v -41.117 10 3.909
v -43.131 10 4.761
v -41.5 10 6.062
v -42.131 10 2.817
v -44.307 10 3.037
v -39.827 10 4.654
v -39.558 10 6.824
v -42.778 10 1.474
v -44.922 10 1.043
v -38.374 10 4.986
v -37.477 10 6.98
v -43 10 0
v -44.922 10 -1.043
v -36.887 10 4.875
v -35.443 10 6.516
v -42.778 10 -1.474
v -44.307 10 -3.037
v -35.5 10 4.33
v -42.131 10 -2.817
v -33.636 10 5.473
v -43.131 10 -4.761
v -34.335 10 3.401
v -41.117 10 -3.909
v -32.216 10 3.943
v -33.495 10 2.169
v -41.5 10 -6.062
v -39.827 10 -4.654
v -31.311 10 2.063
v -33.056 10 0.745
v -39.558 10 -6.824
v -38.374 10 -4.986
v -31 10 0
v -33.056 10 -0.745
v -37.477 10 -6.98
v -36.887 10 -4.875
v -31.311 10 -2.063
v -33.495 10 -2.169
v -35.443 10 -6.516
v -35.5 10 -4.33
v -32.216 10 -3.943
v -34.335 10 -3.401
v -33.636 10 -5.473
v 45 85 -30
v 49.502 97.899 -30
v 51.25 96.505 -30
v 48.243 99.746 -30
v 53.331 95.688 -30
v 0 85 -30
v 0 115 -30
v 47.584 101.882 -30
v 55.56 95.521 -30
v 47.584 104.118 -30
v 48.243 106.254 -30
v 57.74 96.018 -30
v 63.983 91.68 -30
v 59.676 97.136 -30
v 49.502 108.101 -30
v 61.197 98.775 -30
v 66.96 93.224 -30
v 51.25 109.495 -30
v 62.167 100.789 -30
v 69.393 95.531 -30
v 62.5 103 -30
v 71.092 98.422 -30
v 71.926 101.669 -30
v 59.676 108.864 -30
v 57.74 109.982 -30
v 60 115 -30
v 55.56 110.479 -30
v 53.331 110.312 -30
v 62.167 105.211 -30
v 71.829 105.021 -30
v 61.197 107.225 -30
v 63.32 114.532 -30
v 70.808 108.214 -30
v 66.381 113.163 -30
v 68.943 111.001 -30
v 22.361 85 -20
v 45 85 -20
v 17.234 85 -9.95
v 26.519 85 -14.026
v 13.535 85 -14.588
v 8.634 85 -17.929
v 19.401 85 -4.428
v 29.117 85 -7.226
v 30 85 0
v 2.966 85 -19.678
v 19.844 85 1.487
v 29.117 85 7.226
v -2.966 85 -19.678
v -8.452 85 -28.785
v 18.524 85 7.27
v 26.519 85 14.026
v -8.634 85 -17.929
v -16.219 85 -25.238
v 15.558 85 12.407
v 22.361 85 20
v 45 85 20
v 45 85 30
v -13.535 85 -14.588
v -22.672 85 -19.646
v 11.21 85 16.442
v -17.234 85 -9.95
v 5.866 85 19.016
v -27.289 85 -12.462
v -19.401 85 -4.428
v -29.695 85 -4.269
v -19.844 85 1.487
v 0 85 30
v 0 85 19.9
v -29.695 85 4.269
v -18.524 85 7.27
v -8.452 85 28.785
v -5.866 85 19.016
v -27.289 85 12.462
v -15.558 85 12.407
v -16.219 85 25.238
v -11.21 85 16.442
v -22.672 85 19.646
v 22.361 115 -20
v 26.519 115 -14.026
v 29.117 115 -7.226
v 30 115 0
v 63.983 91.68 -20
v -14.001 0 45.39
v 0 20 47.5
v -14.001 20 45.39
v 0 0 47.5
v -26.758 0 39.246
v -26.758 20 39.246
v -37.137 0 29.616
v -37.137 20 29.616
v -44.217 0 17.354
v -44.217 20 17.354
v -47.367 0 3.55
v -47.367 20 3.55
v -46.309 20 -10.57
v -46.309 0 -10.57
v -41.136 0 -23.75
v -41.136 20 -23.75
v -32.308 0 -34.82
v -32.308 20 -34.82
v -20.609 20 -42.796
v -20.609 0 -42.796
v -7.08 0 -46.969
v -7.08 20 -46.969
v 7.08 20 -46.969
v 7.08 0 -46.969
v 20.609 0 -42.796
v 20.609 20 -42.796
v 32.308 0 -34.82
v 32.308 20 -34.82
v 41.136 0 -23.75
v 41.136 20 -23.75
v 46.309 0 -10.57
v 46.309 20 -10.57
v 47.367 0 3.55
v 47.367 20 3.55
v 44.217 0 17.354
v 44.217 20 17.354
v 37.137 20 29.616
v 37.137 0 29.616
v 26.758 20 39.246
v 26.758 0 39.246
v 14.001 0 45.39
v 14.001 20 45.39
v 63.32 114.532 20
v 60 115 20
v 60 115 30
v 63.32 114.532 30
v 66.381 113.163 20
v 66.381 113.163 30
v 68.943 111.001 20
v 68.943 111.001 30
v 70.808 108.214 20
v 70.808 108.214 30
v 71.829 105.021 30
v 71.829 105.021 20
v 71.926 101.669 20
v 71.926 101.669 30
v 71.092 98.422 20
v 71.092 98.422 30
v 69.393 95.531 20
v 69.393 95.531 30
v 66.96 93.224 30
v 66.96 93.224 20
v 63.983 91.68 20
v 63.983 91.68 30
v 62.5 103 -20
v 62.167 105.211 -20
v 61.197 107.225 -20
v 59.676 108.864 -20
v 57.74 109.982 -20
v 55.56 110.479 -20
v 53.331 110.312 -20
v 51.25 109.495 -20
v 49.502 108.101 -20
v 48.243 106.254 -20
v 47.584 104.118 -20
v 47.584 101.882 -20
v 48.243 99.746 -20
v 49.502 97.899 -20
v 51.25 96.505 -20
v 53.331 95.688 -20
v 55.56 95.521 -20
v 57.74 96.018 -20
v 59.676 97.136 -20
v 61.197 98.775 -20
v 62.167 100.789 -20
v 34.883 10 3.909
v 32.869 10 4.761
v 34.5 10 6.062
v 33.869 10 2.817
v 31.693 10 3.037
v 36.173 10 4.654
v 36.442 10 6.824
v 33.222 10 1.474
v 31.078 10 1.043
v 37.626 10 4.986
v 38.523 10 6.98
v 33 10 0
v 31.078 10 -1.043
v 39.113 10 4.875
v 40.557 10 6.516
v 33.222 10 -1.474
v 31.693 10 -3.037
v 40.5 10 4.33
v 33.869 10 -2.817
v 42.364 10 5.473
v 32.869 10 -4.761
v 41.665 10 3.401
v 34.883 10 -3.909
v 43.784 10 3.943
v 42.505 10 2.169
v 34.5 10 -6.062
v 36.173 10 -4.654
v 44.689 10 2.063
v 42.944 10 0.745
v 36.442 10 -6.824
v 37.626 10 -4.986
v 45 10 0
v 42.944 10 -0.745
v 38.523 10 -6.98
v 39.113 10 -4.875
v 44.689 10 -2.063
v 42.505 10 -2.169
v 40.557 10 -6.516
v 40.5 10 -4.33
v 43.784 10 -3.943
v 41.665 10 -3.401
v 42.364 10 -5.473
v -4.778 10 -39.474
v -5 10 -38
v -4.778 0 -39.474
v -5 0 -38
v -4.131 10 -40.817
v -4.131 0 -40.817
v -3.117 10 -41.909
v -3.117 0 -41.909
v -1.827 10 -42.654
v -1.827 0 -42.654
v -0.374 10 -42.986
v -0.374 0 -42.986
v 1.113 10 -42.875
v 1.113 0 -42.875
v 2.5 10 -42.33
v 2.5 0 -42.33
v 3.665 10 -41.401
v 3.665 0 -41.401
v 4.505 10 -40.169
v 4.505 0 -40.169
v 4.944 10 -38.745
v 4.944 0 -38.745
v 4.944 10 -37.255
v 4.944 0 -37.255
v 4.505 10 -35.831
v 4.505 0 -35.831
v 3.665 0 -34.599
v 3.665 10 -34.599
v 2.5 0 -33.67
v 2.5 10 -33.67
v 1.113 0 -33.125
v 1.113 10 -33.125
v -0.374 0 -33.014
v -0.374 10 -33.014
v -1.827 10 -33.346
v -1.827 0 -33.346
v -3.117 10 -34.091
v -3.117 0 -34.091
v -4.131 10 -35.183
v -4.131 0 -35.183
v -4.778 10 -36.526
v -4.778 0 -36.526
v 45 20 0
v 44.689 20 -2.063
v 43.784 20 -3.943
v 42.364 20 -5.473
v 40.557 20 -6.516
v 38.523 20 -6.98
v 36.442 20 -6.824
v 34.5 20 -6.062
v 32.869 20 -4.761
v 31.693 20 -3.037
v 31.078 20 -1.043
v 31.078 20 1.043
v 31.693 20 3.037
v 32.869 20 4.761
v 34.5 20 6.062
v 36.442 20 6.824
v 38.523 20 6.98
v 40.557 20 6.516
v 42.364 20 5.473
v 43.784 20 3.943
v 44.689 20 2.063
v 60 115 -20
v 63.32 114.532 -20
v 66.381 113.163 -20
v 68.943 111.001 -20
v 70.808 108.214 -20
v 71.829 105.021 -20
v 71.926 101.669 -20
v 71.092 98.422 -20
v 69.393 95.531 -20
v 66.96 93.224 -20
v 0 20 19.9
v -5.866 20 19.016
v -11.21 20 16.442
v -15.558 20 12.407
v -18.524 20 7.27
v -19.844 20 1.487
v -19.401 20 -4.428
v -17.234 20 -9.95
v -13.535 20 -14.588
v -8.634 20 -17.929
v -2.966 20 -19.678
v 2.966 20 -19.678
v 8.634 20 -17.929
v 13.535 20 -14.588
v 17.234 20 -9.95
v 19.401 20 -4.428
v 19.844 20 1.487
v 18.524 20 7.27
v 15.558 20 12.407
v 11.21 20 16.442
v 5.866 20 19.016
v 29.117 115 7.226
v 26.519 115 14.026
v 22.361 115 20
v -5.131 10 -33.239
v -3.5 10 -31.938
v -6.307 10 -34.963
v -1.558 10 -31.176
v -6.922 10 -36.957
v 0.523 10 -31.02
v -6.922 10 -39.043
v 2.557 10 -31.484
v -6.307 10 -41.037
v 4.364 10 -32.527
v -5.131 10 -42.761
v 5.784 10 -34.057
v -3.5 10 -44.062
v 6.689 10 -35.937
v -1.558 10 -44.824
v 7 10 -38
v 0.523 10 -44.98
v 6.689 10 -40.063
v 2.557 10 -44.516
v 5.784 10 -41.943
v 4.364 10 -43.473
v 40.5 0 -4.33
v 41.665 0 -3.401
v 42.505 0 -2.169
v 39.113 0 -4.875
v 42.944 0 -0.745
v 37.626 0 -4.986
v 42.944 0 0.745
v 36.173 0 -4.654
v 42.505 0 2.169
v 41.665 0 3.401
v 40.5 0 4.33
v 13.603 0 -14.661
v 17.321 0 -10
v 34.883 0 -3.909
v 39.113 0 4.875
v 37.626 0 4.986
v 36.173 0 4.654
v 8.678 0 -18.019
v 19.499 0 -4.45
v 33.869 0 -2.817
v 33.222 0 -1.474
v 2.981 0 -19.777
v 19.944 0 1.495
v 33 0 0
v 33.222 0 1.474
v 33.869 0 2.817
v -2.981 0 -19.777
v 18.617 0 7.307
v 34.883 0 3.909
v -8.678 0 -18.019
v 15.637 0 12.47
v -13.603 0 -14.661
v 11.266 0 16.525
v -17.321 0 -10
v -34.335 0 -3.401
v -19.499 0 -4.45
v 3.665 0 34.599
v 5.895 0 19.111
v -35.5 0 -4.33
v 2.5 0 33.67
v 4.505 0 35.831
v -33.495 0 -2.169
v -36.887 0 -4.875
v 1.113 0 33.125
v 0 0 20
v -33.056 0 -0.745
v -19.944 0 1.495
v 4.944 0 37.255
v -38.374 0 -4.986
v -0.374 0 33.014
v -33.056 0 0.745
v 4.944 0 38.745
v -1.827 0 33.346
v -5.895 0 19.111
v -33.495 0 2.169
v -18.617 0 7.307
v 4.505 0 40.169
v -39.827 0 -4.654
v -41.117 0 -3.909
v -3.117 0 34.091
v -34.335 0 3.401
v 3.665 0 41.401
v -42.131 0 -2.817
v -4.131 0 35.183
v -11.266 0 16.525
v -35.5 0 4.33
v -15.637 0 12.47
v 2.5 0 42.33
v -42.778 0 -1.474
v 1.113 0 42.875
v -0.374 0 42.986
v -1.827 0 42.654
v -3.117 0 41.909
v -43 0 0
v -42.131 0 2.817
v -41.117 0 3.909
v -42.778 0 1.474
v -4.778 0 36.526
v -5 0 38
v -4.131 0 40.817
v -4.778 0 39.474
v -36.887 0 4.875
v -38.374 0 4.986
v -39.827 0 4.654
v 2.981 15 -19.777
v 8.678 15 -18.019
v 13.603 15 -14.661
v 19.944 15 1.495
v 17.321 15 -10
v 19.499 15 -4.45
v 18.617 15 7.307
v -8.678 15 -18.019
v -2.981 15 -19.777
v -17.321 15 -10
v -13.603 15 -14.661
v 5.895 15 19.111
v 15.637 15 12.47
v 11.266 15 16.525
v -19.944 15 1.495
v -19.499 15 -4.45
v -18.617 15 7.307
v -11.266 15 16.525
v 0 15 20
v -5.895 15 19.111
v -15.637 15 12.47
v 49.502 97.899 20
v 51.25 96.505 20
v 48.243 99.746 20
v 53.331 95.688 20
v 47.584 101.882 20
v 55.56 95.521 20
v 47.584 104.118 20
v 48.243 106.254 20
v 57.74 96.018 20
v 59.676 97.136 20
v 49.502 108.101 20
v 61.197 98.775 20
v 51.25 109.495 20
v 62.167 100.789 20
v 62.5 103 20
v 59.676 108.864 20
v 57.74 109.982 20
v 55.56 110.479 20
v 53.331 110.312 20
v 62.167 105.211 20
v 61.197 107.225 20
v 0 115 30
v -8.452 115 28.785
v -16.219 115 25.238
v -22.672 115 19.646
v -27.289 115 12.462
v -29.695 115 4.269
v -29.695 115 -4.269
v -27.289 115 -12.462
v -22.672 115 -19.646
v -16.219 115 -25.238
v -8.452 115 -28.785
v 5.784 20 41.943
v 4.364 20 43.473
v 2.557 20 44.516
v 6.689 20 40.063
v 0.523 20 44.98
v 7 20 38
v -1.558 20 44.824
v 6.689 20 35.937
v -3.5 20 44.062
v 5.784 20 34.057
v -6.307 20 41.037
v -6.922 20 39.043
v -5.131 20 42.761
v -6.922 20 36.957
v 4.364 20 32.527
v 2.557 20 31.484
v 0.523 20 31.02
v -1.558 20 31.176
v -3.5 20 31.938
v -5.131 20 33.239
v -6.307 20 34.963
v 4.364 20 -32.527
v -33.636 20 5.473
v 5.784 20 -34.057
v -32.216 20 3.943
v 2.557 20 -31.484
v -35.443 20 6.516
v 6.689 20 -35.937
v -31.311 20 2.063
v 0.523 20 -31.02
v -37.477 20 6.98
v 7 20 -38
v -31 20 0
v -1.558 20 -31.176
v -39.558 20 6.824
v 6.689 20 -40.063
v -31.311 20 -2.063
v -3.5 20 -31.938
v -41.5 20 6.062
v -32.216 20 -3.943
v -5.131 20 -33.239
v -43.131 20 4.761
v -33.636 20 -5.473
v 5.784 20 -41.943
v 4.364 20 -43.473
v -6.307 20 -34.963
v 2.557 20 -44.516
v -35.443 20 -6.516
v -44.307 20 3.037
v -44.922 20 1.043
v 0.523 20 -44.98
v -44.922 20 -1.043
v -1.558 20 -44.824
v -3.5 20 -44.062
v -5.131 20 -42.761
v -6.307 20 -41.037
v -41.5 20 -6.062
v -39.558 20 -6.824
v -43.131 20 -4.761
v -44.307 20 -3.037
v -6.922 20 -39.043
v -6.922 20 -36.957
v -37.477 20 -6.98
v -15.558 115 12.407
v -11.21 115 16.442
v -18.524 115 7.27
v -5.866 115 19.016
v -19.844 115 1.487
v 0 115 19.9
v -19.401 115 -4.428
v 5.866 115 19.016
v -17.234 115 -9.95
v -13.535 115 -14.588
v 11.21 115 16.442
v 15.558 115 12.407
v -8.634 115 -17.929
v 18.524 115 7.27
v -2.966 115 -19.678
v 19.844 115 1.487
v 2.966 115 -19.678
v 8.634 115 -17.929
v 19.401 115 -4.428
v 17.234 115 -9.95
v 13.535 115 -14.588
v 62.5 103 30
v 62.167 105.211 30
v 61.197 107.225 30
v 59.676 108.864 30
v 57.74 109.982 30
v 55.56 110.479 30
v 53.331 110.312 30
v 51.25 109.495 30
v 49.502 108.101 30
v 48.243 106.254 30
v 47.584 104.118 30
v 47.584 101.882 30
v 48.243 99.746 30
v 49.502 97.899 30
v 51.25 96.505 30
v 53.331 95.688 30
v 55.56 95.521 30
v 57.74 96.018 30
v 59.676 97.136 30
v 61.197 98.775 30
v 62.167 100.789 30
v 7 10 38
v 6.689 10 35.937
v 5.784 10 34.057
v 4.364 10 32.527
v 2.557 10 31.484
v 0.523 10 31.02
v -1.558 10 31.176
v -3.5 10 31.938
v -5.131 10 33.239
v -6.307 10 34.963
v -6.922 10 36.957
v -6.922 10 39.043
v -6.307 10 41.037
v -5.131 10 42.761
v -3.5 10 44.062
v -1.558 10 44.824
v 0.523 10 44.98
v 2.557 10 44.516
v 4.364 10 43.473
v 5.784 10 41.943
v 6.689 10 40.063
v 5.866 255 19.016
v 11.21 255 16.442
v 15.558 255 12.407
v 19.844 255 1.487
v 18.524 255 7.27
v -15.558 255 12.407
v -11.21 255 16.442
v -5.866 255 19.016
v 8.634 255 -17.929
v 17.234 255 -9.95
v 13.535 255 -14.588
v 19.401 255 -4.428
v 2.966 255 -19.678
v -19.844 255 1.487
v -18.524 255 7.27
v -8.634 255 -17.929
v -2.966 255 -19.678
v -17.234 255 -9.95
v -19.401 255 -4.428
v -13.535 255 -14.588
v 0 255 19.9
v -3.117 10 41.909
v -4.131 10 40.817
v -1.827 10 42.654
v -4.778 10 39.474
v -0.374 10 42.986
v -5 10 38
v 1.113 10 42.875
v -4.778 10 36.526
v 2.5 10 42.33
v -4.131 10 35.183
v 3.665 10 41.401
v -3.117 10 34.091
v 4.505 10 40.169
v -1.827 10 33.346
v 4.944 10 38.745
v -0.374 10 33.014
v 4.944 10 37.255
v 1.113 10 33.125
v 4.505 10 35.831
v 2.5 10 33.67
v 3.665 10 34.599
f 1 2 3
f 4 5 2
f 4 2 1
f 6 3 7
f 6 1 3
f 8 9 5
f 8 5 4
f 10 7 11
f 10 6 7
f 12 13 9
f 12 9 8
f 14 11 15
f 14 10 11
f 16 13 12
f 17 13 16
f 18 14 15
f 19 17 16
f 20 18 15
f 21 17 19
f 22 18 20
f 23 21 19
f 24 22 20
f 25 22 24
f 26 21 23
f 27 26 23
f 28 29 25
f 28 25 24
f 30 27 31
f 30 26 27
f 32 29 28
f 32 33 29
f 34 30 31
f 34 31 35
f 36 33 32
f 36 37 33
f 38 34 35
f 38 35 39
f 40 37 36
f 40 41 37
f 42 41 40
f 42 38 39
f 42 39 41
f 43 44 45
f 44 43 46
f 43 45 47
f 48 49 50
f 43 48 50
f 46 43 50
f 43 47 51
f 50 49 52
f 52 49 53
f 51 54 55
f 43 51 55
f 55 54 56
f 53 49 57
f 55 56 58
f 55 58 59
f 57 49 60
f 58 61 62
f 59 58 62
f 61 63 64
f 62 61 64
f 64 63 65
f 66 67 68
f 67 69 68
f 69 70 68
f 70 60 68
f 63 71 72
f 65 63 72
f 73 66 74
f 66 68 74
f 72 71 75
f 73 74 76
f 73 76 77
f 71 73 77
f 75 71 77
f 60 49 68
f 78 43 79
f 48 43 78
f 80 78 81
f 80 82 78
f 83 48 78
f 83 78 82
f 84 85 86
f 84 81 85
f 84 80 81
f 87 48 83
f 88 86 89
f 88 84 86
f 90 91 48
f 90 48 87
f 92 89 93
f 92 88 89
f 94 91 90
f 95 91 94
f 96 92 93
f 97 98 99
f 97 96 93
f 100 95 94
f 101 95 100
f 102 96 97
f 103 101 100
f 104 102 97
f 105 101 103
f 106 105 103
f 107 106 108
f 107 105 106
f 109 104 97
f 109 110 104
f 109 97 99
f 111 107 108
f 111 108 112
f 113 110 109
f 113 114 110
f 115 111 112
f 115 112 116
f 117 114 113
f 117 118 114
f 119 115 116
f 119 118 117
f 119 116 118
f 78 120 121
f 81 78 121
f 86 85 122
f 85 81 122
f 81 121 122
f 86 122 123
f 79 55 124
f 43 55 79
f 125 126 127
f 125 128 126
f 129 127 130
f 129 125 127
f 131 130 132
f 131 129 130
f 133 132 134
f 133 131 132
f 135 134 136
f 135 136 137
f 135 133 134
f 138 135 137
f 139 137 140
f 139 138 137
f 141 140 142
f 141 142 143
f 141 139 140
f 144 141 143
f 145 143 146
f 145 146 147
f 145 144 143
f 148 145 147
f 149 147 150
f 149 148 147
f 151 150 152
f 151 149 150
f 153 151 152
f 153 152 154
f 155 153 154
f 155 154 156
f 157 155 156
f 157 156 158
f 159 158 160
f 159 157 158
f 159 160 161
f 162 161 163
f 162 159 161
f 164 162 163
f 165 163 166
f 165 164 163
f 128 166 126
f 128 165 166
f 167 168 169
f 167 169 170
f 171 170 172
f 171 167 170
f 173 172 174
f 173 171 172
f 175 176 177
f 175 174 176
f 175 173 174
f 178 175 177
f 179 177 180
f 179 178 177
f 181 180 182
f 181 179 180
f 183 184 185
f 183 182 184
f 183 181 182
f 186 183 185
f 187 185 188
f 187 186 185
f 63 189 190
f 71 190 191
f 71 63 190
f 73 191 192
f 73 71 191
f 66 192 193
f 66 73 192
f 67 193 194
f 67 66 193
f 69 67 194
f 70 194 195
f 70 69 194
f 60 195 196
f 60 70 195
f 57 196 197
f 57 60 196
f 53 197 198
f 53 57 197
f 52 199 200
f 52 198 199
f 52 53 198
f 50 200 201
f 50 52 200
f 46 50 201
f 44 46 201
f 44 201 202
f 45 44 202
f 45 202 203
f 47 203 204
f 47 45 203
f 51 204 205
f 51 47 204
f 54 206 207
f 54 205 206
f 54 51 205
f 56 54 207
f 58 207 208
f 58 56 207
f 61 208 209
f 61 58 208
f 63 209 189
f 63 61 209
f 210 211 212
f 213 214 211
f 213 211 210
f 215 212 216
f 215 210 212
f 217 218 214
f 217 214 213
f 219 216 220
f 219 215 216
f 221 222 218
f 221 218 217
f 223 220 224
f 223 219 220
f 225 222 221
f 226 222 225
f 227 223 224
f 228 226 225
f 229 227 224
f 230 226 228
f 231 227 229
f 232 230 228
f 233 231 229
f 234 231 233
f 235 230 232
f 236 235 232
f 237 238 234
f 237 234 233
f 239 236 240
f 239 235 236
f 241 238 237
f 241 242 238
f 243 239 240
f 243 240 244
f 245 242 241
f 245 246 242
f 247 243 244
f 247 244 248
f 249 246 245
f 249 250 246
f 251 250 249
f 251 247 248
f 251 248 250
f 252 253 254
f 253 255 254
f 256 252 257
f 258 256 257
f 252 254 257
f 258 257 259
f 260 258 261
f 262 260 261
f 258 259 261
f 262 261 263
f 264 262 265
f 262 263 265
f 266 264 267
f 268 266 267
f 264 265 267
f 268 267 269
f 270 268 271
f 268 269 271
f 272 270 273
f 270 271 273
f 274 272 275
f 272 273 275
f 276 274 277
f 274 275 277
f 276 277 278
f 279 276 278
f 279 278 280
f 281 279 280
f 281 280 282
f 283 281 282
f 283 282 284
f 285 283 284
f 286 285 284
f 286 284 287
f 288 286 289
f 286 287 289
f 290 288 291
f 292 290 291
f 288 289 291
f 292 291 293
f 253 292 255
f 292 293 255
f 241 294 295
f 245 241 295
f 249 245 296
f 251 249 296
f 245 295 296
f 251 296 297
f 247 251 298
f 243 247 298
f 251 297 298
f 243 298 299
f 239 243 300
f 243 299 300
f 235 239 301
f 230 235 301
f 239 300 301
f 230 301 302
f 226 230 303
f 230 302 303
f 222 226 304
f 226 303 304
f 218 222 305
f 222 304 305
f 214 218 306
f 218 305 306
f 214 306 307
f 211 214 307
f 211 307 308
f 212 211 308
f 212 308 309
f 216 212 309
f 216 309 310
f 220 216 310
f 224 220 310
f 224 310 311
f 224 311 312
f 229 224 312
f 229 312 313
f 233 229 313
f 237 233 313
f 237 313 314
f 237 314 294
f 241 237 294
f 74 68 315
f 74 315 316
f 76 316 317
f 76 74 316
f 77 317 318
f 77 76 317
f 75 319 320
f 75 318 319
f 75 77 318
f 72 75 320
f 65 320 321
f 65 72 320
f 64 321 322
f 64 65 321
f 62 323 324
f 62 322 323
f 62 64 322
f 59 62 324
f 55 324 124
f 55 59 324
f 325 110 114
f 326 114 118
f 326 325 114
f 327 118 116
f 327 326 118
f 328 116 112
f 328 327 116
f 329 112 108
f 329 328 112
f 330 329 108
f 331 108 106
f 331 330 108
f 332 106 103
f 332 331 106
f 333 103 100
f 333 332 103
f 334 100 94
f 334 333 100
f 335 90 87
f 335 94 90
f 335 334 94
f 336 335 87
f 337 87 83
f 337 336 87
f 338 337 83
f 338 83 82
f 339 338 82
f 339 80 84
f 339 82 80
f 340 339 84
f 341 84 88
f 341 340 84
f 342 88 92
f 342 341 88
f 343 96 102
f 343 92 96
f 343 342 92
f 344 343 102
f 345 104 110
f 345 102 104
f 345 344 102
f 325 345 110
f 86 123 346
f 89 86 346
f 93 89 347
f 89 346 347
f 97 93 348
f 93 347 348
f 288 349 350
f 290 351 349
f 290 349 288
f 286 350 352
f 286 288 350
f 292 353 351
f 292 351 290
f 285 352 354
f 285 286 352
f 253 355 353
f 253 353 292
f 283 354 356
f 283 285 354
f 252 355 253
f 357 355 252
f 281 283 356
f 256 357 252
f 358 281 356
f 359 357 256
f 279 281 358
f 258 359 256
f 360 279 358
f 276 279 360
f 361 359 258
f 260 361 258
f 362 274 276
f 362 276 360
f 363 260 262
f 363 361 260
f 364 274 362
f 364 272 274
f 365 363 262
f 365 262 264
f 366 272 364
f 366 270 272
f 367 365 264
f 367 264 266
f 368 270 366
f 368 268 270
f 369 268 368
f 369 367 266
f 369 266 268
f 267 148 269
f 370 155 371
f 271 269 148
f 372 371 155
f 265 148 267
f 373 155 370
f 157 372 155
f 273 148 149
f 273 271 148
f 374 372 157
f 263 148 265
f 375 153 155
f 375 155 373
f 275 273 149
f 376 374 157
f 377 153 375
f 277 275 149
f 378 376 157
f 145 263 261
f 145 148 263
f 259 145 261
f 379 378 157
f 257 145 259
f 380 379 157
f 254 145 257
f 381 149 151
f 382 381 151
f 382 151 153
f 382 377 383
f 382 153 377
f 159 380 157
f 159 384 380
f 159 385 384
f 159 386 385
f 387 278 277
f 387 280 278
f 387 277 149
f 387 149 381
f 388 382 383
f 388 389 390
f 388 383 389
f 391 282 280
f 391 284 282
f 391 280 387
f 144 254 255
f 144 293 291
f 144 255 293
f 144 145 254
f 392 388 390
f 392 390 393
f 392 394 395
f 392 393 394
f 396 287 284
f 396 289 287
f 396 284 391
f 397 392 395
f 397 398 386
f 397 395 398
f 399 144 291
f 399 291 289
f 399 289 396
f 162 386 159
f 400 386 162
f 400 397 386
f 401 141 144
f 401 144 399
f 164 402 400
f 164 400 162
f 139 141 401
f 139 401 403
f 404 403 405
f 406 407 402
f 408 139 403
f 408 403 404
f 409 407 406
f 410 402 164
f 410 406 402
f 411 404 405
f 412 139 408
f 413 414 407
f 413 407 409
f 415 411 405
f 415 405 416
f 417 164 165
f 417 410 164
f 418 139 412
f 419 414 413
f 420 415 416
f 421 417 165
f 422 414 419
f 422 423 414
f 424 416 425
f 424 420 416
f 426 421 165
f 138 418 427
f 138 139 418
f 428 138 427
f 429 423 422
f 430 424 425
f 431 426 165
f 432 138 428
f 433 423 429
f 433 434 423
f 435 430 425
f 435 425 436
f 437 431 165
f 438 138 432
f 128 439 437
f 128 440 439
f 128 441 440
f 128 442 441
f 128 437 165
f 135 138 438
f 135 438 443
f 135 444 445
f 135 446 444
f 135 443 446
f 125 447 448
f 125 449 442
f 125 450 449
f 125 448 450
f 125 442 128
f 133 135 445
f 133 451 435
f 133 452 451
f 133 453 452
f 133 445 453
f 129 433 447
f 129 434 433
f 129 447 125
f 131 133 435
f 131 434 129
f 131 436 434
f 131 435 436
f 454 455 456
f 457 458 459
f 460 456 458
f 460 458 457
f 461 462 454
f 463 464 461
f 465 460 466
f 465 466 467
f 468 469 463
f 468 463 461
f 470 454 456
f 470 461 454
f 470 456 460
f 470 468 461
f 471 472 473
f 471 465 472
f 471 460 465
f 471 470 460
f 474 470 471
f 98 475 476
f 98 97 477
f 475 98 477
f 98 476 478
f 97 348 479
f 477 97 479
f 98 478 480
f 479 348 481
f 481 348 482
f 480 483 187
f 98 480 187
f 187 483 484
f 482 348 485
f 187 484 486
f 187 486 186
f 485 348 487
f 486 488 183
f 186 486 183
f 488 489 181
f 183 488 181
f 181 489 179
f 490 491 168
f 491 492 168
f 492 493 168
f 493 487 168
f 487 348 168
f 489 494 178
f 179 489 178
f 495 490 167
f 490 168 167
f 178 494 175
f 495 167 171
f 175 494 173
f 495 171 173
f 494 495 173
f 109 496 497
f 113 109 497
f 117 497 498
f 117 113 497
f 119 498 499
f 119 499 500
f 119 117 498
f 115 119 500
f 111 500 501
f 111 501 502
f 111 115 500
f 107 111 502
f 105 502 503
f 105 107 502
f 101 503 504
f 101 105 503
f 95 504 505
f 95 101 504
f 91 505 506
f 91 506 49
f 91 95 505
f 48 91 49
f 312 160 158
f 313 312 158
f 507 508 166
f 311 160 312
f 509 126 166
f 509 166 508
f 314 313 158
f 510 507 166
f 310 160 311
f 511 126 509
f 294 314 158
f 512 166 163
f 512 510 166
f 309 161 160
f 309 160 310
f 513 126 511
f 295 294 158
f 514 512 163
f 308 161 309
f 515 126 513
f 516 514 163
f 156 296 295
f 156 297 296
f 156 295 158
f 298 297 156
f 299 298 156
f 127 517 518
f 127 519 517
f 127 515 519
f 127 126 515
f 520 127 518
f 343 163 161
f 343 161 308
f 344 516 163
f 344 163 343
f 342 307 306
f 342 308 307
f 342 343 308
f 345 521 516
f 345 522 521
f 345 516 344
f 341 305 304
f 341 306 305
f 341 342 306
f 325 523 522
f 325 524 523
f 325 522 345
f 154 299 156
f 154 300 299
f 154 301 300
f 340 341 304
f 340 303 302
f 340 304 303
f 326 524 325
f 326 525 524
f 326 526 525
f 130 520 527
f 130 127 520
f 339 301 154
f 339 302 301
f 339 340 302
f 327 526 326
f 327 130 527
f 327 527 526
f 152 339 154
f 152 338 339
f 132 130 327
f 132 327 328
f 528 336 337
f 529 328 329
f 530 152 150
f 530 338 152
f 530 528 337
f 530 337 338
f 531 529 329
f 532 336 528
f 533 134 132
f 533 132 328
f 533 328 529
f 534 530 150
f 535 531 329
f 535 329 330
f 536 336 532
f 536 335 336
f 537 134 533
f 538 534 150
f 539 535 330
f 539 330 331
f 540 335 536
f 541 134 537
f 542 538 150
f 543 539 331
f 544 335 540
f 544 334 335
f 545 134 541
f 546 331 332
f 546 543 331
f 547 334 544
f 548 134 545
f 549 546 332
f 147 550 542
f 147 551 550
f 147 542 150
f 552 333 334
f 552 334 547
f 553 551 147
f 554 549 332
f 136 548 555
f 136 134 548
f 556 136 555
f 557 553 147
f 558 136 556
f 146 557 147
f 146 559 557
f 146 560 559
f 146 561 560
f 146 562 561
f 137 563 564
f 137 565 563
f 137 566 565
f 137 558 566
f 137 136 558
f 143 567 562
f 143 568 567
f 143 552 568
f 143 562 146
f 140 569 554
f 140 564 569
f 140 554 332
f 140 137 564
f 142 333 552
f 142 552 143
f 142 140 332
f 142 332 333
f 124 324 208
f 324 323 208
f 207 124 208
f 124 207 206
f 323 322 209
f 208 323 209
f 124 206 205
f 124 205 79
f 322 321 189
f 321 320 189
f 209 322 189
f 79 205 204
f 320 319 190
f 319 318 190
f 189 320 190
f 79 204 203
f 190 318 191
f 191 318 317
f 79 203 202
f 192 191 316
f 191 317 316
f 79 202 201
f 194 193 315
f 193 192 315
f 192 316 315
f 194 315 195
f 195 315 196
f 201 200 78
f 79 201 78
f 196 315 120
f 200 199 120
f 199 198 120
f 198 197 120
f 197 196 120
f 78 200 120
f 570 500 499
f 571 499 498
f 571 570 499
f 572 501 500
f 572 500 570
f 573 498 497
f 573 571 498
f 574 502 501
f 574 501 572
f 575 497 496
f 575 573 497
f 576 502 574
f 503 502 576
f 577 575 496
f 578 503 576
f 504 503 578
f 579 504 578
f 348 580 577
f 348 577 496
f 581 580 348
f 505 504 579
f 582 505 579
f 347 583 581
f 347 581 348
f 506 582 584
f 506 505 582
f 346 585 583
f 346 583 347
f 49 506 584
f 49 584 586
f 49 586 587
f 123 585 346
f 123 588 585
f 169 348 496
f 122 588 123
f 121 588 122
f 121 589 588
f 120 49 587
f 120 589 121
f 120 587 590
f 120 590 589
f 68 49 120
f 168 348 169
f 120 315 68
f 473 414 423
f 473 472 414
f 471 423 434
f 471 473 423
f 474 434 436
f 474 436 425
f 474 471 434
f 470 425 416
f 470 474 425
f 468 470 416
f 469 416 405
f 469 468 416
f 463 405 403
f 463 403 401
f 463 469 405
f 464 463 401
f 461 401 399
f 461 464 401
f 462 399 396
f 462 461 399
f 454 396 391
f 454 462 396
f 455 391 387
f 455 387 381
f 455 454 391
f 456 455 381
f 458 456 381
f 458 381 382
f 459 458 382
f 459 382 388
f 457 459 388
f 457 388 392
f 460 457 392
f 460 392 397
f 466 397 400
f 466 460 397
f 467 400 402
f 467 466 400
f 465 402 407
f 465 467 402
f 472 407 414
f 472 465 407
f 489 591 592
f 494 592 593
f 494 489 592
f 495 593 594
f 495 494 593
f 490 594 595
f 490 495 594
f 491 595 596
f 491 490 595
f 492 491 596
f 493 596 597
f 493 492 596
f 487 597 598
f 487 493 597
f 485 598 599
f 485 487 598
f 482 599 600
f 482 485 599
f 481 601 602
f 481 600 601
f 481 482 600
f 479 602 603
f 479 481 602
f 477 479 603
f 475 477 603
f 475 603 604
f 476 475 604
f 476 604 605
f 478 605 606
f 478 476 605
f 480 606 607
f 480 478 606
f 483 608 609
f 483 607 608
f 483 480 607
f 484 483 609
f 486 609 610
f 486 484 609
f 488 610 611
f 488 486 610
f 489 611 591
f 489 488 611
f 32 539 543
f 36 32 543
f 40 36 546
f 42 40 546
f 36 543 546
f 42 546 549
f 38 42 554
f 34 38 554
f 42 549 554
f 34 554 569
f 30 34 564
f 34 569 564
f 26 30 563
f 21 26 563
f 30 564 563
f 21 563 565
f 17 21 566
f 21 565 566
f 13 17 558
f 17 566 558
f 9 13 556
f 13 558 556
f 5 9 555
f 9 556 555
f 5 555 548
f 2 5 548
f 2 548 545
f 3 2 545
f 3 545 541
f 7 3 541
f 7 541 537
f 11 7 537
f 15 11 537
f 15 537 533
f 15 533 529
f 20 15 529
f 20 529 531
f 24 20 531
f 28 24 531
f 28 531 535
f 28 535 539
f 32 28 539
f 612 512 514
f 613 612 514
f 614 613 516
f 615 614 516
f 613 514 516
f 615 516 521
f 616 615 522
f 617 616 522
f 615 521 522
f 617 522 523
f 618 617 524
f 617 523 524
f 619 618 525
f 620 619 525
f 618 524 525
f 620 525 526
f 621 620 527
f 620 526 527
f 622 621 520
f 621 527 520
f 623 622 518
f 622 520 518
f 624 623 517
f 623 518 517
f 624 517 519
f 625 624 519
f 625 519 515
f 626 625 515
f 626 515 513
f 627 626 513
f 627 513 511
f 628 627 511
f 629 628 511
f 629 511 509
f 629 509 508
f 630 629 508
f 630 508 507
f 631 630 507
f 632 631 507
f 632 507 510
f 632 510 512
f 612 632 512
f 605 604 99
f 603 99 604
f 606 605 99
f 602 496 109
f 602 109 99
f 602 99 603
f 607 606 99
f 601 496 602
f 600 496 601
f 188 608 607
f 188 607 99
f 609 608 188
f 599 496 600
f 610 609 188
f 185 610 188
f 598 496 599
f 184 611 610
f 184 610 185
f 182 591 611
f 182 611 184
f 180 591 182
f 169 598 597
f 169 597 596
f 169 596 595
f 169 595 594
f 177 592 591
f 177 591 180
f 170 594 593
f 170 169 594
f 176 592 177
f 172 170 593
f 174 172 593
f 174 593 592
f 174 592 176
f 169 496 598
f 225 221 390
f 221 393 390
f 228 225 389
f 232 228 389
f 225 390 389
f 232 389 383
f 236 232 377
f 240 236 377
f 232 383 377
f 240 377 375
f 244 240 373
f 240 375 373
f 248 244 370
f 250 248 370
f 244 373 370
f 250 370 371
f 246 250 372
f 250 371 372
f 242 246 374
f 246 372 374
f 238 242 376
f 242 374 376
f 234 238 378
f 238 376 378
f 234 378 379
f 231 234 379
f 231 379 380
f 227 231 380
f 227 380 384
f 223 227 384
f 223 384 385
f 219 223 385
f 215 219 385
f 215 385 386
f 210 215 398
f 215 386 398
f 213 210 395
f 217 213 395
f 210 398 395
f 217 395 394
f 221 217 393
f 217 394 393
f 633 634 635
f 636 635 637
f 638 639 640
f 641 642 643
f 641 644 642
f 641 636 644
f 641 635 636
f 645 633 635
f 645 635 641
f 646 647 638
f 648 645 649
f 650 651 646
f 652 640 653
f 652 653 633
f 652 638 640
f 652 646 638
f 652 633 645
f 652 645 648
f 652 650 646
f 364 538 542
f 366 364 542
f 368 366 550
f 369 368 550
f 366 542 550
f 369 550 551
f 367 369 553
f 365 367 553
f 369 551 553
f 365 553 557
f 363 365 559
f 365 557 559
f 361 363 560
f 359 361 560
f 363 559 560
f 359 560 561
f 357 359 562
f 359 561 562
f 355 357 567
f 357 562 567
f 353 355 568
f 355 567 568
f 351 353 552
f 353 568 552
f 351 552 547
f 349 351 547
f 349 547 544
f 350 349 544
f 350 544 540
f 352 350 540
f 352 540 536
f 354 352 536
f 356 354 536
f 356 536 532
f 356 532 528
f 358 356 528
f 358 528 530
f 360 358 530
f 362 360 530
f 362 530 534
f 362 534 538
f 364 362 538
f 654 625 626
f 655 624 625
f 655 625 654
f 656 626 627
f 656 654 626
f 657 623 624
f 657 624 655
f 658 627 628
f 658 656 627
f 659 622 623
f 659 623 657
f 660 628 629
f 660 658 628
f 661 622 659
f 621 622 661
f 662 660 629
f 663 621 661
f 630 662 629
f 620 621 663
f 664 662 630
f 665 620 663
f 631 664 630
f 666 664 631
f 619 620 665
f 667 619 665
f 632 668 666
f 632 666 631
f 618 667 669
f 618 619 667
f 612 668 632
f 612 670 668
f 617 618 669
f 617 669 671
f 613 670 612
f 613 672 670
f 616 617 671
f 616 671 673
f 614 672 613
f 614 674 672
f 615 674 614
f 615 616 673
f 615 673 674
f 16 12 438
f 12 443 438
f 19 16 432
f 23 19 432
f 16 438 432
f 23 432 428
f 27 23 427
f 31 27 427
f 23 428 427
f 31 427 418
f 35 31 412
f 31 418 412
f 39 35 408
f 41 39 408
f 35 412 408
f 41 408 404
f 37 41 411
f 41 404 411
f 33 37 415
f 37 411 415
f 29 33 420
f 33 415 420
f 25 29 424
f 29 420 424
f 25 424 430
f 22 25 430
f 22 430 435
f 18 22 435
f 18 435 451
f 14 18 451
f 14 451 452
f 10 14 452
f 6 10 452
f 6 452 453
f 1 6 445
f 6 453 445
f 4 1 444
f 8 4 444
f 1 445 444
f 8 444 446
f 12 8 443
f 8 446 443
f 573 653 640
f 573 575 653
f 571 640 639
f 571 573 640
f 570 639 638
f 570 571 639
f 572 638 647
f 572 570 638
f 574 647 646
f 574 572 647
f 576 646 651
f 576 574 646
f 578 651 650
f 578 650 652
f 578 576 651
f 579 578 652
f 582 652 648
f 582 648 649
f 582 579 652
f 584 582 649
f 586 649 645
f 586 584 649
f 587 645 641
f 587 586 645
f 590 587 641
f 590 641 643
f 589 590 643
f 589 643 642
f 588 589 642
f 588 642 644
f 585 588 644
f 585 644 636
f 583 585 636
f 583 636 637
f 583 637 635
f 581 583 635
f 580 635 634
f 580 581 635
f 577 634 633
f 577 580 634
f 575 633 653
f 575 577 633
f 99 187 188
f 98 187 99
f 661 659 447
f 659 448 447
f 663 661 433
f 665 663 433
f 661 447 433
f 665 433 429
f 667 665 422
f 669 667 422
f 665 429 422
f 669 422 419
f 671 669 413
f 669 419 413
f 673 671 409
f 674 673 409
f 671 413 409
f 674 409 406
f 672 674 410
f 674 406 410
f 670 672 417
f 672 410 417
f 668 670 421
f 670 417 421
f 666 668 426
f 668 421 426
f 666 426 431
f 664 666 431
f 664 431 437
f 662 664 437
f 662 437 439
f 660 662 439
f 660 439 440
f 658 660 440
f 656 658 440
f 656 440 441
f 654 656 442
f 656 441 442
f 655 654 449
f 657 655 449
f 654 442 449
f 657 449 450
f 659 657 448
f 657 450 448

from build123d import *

# Parameters (mm, degrees)
SKETCH3_R                                = 7.5
BOSS_EXTRUDE1_DEPTH                      = 47.5
BOSS_EXTRUDE1_DEPTH_BACK                 = 47.5
CUT_EXTRUDE1_REACH                       = 166.439
SKETCH4_W                                = 60
SKETCH4_H                                = 17.5
SKETCH4_W_2                              = 12
SKETCH4_H_2                              = 20
CBORE_FOR_M20_HEX_HEAD_BOLT1_D           = 10
CBORE_FOR_M20_HEX_HEAD_BOLT1_CBORE_D     = 14
CBORE_FOR_M20_HEX_HEAD_BOLT1_CBORE_DEPTH = 10


with BuildPart() as part:
    # Sketch2 → Revolve1 (revolve)
    with BuildSketch(Plane.XY, mode=Mode.PRIVATE) as revolve1_sk:
        Polygon((-47.5, 0), (-20, 0), (-20, 15), (0, 15), (0, 255), (-19.9, 255), (-19.9, 115), (-30, 115), (-30, 85), (-19.9, 85), (-19.9, 20), (-47.5, 20), align=None)
    revolve(revolve1_sk.sketch.rotate(Axis((0, 255, 0), (0, -1, 0)), 270), axis=Axis((0, 255, 0), (0, -1, 0)))

    # Sketch3 → Boss-Extrude1 (add, two sides)
    with BuildSketch(Plane.XY) as boss_extrude1_sk:
        with BuildLine():
            Line((0, 115), (60, 115))
            ThreePointArc((60, 115), (71.828663031, 105.020576871), (63.983453822, 91.680455148))
            Line((63.983453822, 91.680455148), (45, 85))
            Line((45, 85), (30, 85))
            Line((30, 85), (0, 85))
            Line((0, 85), (0, 115))
        make_face()
        with Locations((55, 103)):
            Circle(SKETCH3_R, mode=Mode.SUBTRACT)
    extrude(amount=BOSS_EXTRUDE1_DEPTH)
    extrude(boss_extrude1_sk.sketch, amount=-BOSS_EXTRUDE1_DEPTH_BACK)

    # Sketch4 → Cut-Extrude1 (cut, up to next)
    with BuildSketch(Plane(origin=(0, 115, 0), x_dir=(1, 0, 0), z_dir=(0, 1, 0)), mode=Mode.PRIVATE) as cut_extrude1_sk1:
        with Locations((30, -38.75)):
            Rectangle(SKETCH4_W, SKETCH4_H)
    cut_extrude1_tool1 = extrude(cut_extrude1_sk1.sketch, amount=-CUT_EXTRUDE1_REACH, mode=Mode.PRIVATE) & part.part
    # Sketch4 → Cut-Extrude1 (cut, up to next)
    with BuildSketch(Plane(origin=(0, 115, 0), x_dir=(1, 0, 0), z_dir=(0, 1, 0)), mode=Mode.PRIVATE) as cut_extrude1_sk2:
        with Locations((66, -38.75)):
            Rectangle(SKETCH4_W_2, SKETCH4_H)
    cut_extrude1_tool2 = extrude(cut_extrude1_sk2.sketch, amount=-CUT_EXTRUDE1_REACH, mode=Mode.PRIVATE) & part.part
    # Sketch4 → Cut-Extrude1 (cut, up to next)
    with BuildSketch(Plane(origin=(0, 115, 0), x_dir=(1, 0, 0), z_dir=(0, 1, 0)), mode=Mode.PRIVATE) as cut_extrude1_sk3:
        with BuildLine():
            ThreePointArc((30, 0), (28.025170769, -10.704662693), (22.360679775, -20))
            Line((22.360679775, -20), (60, -20))
            Line((60, -20), (60, 0))
            Line((60, 0), (30, 0))
        make_face()
    cut_extrude1_tool3 = extrude(cut_extrude1_sk3.sketch, amount=-CUT_EXTRUDE1_REACH, mode=Mode.PRIVATE) & part.part
    # Sketch4 → Cut-Extrude1 (cut, up to next)
    with BuildSketch(Plane(origin=(0, 115, 0), x_dir=(1, 0, 0), z_dir=(0, 1, 0)), mode=Mode.PRIVATE) as cut_extrude1_sk4:
        with Locations((66, -10)):
            Rectangle(SKETCH4_W_2, SKETCH4_H_2)
    cut_extrude1_tool4 = extrude(cut_extrude1_sk4.sketch, amount=-CUT_EXTRUDE1_REACH, mode=Mode.PRIVATE) & part.part
    # Sketch4 → Cut-Extrude1 (cut, up to next)
    with BuildSketch(Plane(origin=(0, 115, 0), x_dir=(1, 0, 0), z_dir=(0, 1, 0)), mode=Mode.PRIVATE) as cut_extrude1_sk5:
        with BuildLine():
            Line((60, 20), (22.360679775, 20))
            ThreePointArc((22.360679775, 20), (28.025170769, 10.704662693), (30, 0))
            Line((30, 0), (60, 0))
            Line((60, 0), (60, 20))
        make_face()
    cut_extrude1_tool5 = extrude(cut_extrude1_sk5.sketch, amount=-CUT_EXTRUDE1_REACH, mode=Mode.PRIVATE) & part.part
    # Sketch4 → Cut-Extrude1 (cut, up to next)
    with BuildSketch(Plane(origin=(0, 115, 0), x_dir=(1, 0, 0), z_dir=(0, 1, 0)), mode=Mode.PRIVATE) as cut_extrude1_sk6:
        with Locations((66, 10)):
            Rectangle(SKETCH4_W_2, SKETCH4_H_2)
    cut_extrude1_tool6 = extrude(cut_extrude1_sk6.sketch, amount=-CUT_EXTRUDE1_REACH, mode=Mode.PRIVATE) & part.part
    # Sketch4 → Cut-Extrude1 (cut, up to next)
    with BuildSketch(Plane(origin=(0, 115, 0), x_dir=(1, 0, 0), z_dir=(0, 1, 0)), mode=Mode.PRIVATE) as cut_extrude1_sk7:
        with Locations((30, 38.75)):
            Rectangle(SKETCH4_W, SKETCH4_H)
    cut_extrude1_tool7 = extrude(cut_extrude1_sk7.sketch, amount=-CUT_EXTRUDE1_REACH, mode=Mode.PRIVATE) & part.part
    # Sketch4 → Cut-Extrude1 (cut, up to next)
    with BuildSketch(Plane(origin=(0, 115, 0), x_dir=(1, 0, 0), z_dir=(0, 1, 0)), mode=Mode.PRIVATE) as cut_extrude1_sk8:
        with Locations((66, 38.75)):
            Rectangle(SKETCH4_W_2, SKETCH4_H)
    cut_extrude1_tool8 = extrude(cut_extrude1_sk8.sketch, amount=-CUT_EXTRUDE1_REACH, mode=Mode.PRIVATE) & part.part
    add(cut_extrude1_tool1.solids().sort_by_distance((30, 115, 38.75))[0], mode=Mode.SUBTRACT)
    add(cut_extrude1_tool2.solids().sort_by_distance((66, 115, 38.75))[0], mode=Mode.SUBTRACT)
    add(cut_extrude1_tool3.solids().sort_by_distance((43.723217, 115, 10.380581))[0], mode=Mode.SUBTRACT)
    add(cut_extrude1_tool4.solids().sort_by_distance((66, 115, 10))[0], mode=Mode.SUBTRACT)
    add(cut_extrude1_tool5.solids().sort_by_distance((43.723217, 115, -10.380581))[0], mode=Mode.SUBTRACT)
    add(cut_extrude1_tool6.solids().sort_by_distance((66, 115, -10))[0], mode=Mode.SUBTRACT)
    add(cut_extrude1_tool7.solids().sort_by_distance((30, 115, -38.75))[0], mode=Mode.SUBTRACT)
    add(cut_extrude1_tool8.solids().sort_by_distance((66, 115, -38.75))[0], mode=Mode.SUBTRACT)

    # CBORE for M20 Hex Head Bolt1 (through all)
    with Locations(Plane(origin=(0, 20, 0), x_dir=(1, 0, 0), z_dir=(0, 1, 0))):
        with Locations((38, 0), (0, 38), (-38, 0), (0, -38)):
            CounterBoreHole(CBORE_FOR_M20_HEX_HEAD_BOLT1_D / 2, CBORE_FOR_M20_HEX_HEAD_BOLT1_CBORE_D / 2, CBORE_FOR_M20_HEX_HEAD_BOLT1_CBORE_DEPTH)


solid = part.part
